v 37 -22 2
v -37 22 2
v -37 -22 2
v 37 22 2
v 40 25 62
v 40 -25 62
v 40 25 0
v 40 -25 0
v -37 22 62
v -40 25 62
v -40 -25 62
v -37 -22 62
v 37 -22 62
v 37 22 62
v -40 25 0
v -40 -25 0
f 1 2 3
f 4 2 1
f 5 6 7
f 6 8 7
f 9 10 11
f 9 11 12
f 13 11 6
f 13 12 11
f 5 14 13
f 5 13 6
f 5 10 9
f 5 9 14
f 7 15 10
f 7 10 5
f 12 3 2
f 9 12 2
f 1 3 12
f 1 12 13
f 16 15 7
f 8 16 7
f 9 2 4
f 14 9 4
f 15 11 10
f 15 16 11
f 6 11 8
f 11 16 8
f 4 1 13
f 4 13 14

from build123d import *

# Parameters (mm, degrees)
F0_W     = 80
F0_H     = 50
F1_DEPTH = 2
F2_W     = 80
F2_H     = 50
F2_W_2   = 74
F2_H_2   = 44
F3_DEPTH = 60


with BuildPart() as f1:
    # F0 (on Top) → F1 (new body)
    with BuildSketch(Plane.XY):
        Rectangle(F0_W, F0_H)
    extrude(amount=F1_DEPTH)

    # F2 (on face) → F3 (join)
    with BuildSketch(Plane.XY.offset(2)):
        Rectangle(F2_W, F2_H)
        Rectangle(F2_W_2, F2_H_2, mode=Mode.SUBTRACT)
    extrude(amount=F3_DEPTH)


solid = f1.part
